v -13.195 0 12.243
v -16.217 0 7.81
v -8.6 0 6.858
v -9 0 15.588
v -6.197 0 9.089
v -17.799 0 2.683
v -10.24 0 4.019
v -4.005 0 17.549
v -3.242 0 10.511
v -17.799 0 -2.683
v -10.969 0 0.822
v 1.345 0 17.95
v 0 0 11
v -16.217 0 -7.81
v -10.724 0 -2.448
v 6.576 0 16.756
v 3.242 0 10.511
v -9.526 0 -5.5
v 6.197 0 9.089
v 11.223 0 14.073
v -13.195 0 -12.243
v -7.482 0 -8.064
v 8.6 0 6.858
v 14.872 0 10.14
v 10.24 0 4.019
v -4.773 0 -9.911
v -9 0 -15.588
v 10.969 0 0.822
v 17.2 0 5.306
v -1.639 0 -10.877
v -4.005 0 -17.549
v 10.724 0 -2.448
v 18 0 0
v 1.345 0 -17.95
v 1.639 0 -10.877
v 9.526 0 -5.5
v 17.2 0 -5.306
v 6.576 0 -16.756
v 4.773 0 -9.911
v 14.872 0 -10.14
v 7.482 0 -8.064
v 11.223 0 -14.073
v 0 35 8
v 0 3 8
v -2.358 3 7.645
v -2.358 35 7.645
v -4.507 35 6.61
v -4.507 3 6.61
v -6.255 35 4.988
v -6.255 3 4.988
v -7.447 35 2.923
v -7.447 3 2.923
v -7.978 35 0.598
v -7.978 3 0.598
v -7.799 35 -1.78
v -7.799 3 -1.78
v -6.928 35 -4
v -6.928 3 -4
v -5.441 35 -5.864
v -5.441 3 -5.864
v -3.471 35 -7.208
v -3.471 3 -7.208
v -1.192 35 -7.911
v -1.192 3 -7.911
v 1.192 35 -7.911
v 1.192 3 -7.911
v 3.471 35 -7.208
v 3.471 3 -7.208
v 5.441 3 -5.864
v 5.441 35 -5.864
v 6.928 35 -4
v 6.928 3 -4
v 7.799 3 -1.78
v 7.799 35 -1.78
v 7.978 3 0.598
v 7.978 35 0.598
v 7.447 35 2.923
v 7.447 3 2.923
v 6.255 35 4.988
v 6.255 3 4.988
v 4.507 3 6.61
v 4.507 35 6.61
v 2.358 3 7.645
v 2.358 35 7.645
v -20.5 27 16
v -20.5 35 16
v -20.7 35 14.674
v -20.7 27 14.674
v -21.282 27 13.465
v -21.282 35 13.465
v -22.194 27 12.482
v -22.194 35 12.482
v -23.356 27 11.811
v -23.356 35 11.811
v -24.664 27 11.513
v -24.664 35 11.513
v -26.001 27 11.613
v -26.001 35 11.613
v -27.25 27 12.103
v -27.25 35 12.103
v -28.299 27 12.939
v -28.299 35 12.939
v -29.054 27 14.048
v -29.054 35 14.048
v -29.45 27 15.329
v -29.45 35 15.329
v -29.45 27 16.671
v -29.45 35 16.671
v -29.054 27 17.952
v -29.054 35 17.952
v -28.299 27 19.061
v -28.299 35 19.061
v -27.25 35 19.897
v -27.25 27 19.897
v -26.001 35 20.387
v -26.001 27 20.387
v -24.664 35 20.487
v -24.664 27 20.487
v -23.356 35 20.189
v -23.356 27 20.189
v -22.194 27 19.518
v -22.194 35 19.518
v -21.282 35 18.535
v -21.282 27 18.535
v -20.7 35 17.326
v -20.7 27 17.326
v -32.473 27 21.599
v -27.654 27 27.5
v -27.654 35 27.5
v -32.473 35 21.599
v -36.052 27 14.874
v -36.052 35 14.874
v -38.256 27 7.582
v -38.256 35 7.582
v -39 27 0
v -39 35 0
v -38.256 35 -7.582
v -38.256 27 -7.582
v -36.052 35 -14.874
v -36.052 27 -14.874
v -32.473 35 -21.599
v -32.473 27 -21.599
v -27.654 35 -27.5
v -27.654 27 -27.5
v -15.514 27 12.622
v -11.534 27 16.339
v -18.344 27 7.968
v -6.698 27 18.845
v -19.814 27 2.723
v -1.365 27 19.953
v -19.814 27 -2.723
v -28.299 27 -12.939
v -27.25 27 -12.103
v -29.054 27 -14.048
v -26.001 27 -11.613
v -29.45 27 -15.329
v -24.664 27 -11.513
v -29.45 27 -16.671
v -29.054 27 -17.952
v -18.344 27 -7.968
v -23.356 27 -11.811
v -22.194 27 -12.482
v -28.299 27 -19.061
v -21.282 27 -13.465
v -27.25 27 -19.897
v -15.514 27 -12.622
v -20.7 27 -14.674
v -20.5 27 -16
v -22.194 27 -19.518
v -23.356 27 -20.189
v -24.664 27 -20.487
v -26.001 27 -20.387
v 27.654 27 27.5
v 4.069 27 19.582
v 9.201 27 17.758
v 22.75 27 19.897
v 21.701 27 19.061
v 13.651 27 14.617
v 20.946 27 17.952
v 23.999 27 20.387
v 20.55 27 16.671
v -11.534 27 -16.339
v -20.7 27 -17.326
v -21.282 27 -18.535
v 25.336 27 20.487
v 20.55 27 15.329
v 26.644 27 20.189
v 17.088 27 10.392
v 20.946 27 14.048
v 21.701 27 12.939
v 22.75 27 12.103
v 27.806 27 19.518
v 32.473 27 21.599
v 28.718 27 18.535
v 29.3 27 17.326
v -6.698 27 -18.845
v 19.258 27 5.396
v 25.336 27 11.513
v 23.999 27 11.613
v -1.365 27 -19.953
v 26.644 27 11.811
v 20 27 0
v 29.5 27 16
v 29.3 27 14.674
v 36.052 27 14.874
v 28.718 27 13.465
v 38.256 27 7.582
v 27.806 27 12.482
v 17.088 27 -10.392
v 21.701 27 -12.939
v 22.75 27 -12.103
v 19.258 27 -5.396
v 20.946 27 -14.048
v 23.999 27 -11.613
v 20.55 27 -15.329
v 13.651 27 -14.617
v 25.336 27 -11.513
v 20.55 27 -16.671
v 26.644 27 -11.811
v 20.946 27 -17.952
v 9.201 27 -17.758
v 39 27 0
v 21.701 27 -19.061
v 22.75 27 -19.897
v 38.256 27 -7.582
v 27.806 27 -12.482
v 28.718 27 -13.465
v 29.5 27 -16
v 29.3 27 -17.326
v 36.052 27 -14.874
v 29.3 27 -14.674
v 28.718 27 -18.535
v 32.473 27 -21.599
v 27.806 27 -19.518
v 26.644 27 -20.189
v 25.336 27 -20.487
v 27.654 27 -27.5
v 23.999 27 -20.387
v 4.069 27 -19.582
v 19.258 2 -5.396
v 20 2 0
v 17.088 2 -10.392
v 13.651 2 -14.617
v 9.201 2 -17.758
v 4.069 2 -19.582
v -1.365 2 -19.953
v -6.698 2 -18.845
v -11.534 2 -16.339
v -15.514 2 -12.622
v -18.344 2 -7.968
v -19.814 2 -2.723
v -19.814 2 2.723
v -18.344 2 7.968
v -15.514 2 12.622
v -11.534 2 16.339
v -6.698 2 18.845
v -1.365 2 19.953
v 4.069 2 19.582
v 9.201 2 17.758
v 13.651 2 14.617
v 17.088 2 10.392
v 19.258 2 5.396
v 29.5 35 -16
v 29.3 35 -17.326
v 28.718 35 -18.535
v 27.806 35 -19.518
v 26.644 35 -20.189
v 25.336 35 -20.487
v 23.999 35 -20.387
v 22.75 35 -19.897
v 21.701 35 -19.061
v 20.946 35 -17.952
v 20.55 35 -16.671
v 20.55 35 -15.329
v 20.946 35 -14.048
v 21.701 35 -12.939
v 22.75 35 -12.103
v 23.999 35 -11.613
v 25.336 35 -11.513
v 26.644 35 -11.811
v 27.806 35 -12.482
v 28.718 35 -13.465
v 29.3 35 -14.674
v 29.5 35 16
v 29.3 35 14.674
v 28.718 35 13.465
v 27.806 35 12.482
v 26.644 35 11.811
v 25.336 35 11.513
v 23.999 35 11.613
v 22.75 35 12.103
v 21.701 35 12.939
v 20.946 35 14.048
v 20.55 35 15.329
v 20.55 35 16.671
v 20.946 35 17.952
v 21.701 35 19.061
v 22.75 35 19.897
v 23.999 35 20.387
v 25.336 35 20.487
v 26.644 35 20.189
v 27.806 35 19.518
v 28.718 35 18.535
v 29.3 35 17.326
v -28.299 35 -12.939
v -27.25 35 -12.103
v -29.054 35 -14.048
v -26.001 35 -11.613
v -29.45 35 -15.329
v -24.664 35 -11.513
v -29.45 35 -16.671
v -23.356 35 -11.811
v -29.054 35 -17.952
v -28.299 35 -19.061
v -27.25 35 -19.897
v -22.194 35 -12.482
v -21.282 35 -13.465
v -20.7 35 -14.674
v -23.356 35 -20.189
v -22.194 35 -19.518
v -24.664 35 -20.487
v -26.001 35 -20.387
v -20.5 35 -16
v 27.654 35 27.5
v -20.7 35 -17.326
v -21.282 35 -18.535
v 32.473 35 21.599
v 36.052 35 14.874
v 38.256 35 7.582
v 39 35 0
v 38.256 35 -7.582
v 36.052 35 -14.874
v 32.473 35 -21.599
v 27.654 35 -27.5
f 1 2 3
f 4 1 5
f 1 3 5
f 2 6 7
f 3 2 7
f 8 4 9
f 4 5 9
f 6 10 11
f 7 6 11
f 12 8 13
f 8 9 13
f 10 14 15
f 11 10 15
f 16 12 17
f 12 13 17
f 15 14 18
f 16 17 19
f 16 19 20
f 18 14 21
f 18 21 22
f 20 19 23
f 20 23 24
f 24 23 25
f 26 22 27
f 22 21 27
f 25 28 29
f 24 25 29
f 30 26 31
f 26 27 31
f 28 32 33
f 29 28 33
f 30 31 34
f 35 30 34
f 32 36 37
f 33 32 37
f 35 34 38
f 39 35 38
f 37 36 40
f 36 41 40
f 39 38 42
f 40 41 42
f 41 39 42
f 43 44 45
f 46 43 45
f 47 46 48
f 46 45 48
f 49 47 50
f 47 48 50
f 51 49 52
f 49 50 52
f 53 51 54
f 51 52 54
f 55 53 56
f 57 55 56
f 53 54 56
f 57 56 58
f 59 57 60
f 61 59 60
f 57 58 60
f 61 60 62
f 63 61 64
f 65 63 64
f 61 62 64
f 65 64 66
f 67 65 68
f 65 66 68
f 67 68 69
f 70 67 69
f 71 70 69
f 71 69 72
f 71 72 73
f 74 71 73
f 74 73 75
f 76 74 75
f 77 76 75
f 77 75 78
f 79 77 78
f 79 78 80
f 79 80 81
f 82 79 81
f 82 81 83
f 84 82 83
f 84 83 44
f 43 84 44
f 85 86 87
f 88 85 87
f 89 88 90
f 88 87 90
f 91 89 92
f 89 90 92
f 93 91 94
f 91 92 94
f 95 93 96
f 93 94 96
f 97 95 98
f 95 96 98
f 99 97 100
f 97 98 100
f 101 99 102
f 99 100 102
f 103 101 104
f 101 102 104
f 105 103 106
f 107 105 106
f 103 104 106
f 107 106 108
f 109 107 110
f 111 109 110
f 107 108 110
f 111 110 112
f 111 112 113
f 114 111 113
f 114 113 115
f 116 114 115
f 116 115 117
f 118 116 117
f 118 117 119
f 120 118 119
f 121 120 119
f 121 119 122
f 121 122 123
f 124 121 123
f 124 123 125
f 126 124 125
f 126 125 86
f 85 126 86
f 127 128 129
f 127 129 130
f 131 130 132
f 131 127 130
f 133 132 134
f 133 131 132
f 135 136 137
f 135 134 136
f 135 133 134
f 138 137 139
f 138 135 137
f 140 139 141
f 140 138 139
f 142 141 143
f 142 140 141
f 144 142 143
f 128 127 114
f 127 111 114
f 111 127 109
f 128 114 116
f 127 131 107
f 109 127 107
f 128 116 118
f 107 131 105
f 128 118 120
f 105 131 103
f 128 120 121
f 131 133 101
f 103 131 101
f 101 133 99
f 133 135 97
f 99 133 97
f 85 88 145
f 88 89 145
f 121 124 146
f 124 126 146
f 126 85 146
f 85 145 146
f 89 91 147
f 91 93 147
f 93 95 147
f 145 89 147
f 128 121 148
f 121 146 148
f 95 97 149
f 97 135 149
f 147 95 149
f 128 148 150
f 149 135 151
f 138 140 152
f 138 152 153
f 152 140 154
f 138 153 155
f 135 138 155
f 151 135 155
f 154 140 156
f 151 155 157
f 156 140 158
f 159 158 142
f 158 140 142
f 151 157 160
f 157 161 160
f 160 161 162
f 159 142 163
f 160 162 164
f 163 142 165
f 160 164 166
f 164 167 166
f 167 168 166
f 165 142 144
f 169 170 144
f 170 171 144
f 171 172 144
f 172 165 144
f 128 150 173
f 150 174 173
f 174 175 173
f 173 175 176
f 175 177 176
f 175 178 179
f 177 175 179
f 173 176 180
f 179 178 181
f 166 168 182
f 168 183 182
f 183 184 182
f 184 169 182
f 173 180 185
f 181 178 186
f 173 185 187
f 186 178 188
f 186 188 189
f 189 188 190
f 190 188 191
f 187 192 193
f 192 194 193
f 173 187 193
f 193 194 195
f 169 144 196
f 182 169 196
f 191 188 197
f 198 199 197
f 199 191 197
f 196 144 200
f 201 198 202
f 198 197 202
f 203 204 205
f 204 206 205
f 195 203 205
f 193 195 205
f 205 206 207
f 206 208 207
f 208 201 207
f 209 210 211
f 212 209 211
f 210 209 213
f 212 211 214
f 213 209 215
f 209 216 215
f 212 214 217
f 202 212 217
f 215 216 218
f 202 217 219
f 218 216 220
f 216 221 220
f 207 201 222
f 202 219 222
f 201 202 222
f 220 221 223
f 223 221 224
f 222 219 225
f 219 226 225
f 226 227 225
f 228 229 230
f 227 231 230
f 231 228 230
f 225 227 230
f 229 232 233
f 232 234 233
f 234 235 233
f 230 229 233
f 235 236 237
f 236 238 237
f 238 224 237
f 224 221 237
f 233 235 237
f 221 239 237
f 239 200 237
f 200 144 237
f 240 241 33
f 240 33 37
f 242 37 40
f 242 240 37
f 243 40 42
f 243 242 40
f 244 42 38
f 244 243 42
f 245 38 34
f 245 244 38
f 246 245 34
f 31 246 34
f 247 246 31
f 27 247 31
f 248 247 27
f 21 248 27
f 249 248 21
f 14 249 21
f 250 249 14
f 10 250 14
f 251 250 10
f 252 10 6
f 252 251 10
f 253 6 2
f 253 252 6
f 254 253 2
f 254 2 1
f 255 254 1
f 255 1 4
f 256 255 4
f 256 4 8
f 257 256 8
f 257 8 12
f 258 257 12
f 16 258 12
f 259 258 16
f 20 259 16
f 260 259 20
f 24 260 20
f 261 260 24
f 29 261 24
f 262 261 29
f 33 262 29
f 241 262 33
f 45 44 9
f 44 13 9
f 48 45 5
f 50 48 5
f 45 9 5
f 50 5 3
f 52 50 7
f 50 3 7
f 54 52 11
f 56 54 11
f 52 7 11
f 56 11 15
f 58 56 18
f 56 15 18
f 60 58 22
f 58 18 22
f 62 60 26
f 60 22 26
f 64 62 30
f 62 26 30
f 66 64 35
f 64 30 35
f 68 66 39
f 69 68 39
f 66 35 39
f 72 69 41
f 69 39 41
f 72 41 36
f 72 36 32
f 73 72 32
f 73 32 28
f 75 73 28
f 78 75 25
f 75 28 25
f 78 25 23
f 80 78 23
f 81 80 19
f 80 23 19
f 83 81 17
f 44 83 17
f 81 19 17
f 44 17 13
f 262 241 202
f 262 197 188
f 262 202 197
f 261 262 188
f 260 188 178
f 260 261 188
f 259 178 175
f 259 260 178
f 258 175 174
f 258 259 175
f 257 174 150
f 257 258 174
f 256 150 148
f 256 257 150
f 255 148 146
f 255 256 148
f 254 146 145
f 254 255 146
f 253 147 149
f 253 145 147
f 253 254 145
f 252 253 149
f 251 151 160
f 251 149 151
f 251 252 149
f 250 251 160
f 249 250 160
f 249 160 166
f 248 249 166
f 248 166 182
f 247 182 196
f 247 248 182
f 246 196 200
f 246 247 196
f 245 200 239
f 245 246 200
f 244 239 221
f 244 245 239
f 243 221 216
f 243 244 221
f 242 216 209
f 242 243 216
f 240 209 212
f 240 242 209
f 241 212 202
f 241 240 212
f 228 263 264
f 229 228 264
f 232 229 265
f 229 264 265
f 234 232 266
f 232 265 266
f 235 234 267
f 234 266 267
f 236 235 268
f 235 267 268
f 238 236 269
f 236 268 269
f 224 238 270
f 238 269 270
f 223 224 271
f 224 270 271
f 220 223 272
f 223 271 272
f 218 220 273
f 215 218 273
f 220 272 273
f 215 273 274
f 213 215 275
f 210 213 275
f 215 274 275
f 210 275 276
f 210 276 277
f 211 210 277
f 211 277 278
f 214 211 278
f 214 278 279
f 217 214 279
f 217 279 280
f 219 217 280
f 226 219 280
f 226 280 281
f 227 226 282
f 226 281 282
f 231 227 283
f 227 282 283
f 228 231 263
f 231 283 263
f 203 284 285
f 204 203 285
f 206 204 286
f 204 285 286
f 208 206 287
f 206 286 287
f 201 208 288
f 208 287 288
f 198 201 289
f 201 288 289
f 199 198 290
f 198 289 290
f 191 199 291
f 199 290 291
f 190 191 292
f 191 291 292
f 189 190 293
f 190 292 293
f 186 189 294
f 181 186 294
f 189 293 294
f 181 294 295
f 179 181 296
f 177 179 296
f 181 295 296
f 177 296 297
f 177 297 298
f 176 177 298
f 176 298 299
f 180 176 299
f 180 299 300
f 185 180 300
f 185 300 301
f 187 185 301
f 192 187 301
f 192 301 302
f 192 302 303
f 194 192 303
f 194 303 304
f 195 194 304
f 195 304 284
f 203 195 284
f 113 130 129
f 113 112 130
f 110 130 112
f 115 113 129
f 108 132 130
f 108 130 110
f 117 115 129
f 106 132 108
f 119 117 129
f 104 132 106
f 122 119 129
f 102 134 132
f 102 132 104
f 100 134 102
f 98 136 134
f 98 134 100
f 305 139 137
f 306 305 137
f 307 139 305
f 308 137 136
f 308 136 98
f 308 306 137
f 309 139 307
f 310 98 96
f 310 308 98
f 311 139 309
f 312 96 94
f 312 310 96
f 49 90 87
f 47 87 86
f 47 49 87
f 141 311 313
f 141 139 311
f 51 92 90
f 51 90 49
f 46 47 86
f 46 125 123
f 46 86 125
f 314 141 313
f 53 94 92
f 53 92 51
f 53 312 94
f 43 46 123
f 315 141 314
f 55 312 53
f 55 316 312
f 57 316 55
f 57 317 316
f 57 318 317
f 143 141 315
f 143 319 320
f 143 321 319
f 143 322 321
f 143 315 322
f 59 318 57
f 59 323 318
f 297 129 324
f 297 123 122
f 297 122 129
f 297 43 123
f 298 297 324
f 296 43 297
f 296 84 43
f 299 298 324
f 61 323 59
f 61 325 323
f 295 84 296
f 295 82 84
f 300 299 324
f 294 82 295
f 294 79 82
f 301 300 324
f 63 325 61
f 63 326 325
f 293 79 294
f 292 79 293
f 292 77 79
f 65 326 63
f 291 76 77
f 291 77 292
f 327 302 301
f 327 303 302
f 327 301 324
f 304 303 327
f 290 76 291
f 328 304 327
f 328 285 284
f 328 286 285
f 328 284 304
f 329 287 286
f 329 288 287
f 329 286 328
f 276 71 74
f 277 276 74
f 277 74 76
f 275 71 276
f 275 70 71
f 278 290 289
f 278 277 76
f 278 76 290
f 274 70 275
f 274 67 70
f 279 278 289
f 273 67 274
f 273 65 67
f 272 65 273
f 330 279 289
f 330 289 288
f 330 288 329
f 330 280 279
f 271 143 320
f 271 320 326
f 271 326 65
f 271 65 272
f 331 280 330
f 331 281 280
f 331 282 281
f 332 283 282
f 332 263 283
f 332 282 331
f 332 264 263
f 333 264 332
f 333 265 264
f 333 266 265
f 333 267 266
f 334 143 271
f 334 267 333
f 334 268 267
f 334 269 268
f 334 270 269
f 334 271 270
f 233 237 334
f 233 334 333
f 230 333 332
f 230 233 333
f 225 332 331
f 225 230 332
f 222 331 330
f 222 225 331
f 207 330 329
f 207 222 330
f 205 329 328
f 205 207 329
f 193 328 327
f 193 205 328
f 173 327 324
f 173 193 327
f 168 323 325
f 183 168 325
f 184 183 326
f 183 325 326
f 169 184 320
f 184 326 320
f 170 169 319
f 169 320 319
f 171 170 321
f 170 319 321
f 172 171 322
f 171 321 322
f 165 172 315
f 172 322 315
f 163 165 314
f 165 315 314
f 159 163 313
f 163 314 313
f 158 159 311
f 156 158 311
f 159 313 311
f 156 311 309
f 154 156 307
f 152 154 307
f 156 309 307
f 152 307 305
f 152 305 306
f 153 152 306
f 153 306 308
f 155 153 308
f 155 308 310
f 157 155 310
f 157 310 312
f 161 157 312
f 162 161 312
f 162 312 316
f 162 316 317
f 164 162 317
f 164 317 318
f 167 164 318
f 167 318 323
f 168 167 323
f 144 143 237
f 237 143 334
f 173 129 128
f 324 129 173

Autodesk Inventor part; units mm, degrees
ref_plane "YZ Plane" through (0, 0, 0) normal (1, 0, 0) x (0, 1, 0)
ref_plane "XZ Plane" through (0, 0, 0) normal (0, 1, 0) x (-1, 0, 0)
ref_plane "XY Plane" through (0, 0, 0) normal (0, 0, 1) x (1, 0, 0)
sketch "Эскиз1" plane through (0, 0, 0) normal (0, 0, 1) x (1, 0, 0)
  line L0 (0, 0) -> (0, 35)
  line L1 (0, 35) -> (39, 35)
  line L2 (39, 35) -> (39, 27)
  line L3 (39, 27) -> (20, 27)
  line L4 (20, 27) -> (20, 0)
  line L5 (20, 0) -> (0, 0)
  dimension "d0" = 78
  dimension "d1" = 40
  dimension "d2" = 8
  dimension "d3" = 35
revolve "Вращение1" add sketch "Эскиз1" angle 360 about axis through (0, 0, 0) along (0, 1, 0)
sketch "Эскиз2" plane through (0, 35, 0) normal (0, 1, 0) x (1, 0, 0)
  circle A0 centre (0, 0) radius 39 projected
  line L0 (-39, 0) -> (39, 0) construction
  line L1 (-27.6541, 27.5) -> (27.6541, 27.5)
  line L2 (-27.6541, -27.5) -> (27.6541, -27.5)
  line L3 (-25, -16) -> (25, -16) construction
  line L4 (25, -16) -> (25, 16) construction
  line L5 (25, 16) -> (-25, 16) construction
  line L6 (-25, 16) -> (-25, -16) construction
  line L7 (-25, -16) -> (25, 16) construction
  line L8 (25, -16) -> (-25, 16) construction
  circle A1 centre (-25, 16) radius 4.5
  circle A2 centre (-25, -16) radius 4.5
  circle A3 centre (25, -16) radius 4.5
  circle A4 centre (25, 16) radius 4.5
  dimension "d5" = 55
  dimension "d6" = 50
  dimension "d7" = 32
  dimension "d10" = 9
extrude "Выдавливание1" cut sketch "Эскиз2" against normal through all contours L1 A0 | A0 L2 | A1 | A2 | A3 | A4
hole "Отверстие1" at (0, 35, 0) direction (0, -1, 0) diameter 16 end through all thread size "TR24x8" class "7H" standard "ISO Metric Trapezoidal Threads"
chamfer "Фаска1" distance 3 angle 45 1 edges at (0, 0, -8)
chamfer "Фаска2" distance 2 angle 45 1 edges at (-20, 0, 0)
properties part number "Втулка 4"
